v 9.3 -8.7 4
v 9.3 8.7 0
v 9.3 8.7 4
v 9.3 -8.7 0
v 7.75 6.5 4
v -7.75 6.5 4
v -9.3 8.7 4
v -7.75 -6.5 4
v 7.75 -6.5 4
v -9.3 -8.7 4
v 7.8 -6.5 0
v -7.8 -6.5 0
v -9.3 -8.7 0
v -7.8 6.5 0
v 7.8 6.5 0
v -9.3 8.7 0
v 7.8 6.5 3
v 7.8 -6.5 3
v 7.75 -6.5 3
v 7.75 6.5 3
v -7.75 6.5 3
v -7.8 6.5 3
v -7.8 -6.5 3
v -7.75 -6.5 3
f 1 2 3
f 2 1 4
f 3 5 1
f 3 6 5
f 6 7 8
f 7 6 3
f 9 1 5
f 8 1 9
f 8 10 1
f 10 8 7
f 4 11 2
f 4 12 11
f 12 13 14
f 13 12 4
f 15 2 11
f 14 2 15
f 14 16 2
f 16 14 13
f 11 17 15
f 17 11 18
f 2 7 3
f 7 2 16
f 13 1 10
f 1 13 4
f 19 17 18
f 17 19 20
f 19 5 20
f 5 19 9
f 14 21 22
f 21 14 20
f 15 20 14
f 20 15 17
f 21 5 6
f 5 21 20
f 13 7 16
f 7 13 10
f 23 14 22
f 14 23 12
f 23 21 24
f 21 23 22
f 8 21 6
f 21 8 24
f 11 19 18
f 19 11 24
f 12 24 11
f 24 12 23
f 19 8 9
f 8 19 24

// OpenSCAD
union () {
  union () {
    translate ([0, 7.6, 2]) {
      cube ([17.4, 2.2, 4], center=true);
    }
    union () {
      translate ([8.55, 0, 2]) {
        cube ([1.5, 17.4, 4], center=true);
      }
      translate ([8.5, 0, 7/2]) {
        cube ([1.5, 17.4, 1.0], center=true);
      }
    }
  }
  mirror ([0, 1, 0]) {
    mirror ([1, 0, 0]) {
      union () {
        translate ([0, 7.6, 2]) {
          cube ([17.4, 2.2, 4], center=true);
        }
        union () {
          translate ([8.55, 0, 2]) {
            cube ([1.5, 17.4, 4], center=true);
          }
          translate ([8.5, 0, 7/2]) {
            cube ([1.5, 17.4, 1.0], center=true);
          }
        }
      }
    }
  }
}
